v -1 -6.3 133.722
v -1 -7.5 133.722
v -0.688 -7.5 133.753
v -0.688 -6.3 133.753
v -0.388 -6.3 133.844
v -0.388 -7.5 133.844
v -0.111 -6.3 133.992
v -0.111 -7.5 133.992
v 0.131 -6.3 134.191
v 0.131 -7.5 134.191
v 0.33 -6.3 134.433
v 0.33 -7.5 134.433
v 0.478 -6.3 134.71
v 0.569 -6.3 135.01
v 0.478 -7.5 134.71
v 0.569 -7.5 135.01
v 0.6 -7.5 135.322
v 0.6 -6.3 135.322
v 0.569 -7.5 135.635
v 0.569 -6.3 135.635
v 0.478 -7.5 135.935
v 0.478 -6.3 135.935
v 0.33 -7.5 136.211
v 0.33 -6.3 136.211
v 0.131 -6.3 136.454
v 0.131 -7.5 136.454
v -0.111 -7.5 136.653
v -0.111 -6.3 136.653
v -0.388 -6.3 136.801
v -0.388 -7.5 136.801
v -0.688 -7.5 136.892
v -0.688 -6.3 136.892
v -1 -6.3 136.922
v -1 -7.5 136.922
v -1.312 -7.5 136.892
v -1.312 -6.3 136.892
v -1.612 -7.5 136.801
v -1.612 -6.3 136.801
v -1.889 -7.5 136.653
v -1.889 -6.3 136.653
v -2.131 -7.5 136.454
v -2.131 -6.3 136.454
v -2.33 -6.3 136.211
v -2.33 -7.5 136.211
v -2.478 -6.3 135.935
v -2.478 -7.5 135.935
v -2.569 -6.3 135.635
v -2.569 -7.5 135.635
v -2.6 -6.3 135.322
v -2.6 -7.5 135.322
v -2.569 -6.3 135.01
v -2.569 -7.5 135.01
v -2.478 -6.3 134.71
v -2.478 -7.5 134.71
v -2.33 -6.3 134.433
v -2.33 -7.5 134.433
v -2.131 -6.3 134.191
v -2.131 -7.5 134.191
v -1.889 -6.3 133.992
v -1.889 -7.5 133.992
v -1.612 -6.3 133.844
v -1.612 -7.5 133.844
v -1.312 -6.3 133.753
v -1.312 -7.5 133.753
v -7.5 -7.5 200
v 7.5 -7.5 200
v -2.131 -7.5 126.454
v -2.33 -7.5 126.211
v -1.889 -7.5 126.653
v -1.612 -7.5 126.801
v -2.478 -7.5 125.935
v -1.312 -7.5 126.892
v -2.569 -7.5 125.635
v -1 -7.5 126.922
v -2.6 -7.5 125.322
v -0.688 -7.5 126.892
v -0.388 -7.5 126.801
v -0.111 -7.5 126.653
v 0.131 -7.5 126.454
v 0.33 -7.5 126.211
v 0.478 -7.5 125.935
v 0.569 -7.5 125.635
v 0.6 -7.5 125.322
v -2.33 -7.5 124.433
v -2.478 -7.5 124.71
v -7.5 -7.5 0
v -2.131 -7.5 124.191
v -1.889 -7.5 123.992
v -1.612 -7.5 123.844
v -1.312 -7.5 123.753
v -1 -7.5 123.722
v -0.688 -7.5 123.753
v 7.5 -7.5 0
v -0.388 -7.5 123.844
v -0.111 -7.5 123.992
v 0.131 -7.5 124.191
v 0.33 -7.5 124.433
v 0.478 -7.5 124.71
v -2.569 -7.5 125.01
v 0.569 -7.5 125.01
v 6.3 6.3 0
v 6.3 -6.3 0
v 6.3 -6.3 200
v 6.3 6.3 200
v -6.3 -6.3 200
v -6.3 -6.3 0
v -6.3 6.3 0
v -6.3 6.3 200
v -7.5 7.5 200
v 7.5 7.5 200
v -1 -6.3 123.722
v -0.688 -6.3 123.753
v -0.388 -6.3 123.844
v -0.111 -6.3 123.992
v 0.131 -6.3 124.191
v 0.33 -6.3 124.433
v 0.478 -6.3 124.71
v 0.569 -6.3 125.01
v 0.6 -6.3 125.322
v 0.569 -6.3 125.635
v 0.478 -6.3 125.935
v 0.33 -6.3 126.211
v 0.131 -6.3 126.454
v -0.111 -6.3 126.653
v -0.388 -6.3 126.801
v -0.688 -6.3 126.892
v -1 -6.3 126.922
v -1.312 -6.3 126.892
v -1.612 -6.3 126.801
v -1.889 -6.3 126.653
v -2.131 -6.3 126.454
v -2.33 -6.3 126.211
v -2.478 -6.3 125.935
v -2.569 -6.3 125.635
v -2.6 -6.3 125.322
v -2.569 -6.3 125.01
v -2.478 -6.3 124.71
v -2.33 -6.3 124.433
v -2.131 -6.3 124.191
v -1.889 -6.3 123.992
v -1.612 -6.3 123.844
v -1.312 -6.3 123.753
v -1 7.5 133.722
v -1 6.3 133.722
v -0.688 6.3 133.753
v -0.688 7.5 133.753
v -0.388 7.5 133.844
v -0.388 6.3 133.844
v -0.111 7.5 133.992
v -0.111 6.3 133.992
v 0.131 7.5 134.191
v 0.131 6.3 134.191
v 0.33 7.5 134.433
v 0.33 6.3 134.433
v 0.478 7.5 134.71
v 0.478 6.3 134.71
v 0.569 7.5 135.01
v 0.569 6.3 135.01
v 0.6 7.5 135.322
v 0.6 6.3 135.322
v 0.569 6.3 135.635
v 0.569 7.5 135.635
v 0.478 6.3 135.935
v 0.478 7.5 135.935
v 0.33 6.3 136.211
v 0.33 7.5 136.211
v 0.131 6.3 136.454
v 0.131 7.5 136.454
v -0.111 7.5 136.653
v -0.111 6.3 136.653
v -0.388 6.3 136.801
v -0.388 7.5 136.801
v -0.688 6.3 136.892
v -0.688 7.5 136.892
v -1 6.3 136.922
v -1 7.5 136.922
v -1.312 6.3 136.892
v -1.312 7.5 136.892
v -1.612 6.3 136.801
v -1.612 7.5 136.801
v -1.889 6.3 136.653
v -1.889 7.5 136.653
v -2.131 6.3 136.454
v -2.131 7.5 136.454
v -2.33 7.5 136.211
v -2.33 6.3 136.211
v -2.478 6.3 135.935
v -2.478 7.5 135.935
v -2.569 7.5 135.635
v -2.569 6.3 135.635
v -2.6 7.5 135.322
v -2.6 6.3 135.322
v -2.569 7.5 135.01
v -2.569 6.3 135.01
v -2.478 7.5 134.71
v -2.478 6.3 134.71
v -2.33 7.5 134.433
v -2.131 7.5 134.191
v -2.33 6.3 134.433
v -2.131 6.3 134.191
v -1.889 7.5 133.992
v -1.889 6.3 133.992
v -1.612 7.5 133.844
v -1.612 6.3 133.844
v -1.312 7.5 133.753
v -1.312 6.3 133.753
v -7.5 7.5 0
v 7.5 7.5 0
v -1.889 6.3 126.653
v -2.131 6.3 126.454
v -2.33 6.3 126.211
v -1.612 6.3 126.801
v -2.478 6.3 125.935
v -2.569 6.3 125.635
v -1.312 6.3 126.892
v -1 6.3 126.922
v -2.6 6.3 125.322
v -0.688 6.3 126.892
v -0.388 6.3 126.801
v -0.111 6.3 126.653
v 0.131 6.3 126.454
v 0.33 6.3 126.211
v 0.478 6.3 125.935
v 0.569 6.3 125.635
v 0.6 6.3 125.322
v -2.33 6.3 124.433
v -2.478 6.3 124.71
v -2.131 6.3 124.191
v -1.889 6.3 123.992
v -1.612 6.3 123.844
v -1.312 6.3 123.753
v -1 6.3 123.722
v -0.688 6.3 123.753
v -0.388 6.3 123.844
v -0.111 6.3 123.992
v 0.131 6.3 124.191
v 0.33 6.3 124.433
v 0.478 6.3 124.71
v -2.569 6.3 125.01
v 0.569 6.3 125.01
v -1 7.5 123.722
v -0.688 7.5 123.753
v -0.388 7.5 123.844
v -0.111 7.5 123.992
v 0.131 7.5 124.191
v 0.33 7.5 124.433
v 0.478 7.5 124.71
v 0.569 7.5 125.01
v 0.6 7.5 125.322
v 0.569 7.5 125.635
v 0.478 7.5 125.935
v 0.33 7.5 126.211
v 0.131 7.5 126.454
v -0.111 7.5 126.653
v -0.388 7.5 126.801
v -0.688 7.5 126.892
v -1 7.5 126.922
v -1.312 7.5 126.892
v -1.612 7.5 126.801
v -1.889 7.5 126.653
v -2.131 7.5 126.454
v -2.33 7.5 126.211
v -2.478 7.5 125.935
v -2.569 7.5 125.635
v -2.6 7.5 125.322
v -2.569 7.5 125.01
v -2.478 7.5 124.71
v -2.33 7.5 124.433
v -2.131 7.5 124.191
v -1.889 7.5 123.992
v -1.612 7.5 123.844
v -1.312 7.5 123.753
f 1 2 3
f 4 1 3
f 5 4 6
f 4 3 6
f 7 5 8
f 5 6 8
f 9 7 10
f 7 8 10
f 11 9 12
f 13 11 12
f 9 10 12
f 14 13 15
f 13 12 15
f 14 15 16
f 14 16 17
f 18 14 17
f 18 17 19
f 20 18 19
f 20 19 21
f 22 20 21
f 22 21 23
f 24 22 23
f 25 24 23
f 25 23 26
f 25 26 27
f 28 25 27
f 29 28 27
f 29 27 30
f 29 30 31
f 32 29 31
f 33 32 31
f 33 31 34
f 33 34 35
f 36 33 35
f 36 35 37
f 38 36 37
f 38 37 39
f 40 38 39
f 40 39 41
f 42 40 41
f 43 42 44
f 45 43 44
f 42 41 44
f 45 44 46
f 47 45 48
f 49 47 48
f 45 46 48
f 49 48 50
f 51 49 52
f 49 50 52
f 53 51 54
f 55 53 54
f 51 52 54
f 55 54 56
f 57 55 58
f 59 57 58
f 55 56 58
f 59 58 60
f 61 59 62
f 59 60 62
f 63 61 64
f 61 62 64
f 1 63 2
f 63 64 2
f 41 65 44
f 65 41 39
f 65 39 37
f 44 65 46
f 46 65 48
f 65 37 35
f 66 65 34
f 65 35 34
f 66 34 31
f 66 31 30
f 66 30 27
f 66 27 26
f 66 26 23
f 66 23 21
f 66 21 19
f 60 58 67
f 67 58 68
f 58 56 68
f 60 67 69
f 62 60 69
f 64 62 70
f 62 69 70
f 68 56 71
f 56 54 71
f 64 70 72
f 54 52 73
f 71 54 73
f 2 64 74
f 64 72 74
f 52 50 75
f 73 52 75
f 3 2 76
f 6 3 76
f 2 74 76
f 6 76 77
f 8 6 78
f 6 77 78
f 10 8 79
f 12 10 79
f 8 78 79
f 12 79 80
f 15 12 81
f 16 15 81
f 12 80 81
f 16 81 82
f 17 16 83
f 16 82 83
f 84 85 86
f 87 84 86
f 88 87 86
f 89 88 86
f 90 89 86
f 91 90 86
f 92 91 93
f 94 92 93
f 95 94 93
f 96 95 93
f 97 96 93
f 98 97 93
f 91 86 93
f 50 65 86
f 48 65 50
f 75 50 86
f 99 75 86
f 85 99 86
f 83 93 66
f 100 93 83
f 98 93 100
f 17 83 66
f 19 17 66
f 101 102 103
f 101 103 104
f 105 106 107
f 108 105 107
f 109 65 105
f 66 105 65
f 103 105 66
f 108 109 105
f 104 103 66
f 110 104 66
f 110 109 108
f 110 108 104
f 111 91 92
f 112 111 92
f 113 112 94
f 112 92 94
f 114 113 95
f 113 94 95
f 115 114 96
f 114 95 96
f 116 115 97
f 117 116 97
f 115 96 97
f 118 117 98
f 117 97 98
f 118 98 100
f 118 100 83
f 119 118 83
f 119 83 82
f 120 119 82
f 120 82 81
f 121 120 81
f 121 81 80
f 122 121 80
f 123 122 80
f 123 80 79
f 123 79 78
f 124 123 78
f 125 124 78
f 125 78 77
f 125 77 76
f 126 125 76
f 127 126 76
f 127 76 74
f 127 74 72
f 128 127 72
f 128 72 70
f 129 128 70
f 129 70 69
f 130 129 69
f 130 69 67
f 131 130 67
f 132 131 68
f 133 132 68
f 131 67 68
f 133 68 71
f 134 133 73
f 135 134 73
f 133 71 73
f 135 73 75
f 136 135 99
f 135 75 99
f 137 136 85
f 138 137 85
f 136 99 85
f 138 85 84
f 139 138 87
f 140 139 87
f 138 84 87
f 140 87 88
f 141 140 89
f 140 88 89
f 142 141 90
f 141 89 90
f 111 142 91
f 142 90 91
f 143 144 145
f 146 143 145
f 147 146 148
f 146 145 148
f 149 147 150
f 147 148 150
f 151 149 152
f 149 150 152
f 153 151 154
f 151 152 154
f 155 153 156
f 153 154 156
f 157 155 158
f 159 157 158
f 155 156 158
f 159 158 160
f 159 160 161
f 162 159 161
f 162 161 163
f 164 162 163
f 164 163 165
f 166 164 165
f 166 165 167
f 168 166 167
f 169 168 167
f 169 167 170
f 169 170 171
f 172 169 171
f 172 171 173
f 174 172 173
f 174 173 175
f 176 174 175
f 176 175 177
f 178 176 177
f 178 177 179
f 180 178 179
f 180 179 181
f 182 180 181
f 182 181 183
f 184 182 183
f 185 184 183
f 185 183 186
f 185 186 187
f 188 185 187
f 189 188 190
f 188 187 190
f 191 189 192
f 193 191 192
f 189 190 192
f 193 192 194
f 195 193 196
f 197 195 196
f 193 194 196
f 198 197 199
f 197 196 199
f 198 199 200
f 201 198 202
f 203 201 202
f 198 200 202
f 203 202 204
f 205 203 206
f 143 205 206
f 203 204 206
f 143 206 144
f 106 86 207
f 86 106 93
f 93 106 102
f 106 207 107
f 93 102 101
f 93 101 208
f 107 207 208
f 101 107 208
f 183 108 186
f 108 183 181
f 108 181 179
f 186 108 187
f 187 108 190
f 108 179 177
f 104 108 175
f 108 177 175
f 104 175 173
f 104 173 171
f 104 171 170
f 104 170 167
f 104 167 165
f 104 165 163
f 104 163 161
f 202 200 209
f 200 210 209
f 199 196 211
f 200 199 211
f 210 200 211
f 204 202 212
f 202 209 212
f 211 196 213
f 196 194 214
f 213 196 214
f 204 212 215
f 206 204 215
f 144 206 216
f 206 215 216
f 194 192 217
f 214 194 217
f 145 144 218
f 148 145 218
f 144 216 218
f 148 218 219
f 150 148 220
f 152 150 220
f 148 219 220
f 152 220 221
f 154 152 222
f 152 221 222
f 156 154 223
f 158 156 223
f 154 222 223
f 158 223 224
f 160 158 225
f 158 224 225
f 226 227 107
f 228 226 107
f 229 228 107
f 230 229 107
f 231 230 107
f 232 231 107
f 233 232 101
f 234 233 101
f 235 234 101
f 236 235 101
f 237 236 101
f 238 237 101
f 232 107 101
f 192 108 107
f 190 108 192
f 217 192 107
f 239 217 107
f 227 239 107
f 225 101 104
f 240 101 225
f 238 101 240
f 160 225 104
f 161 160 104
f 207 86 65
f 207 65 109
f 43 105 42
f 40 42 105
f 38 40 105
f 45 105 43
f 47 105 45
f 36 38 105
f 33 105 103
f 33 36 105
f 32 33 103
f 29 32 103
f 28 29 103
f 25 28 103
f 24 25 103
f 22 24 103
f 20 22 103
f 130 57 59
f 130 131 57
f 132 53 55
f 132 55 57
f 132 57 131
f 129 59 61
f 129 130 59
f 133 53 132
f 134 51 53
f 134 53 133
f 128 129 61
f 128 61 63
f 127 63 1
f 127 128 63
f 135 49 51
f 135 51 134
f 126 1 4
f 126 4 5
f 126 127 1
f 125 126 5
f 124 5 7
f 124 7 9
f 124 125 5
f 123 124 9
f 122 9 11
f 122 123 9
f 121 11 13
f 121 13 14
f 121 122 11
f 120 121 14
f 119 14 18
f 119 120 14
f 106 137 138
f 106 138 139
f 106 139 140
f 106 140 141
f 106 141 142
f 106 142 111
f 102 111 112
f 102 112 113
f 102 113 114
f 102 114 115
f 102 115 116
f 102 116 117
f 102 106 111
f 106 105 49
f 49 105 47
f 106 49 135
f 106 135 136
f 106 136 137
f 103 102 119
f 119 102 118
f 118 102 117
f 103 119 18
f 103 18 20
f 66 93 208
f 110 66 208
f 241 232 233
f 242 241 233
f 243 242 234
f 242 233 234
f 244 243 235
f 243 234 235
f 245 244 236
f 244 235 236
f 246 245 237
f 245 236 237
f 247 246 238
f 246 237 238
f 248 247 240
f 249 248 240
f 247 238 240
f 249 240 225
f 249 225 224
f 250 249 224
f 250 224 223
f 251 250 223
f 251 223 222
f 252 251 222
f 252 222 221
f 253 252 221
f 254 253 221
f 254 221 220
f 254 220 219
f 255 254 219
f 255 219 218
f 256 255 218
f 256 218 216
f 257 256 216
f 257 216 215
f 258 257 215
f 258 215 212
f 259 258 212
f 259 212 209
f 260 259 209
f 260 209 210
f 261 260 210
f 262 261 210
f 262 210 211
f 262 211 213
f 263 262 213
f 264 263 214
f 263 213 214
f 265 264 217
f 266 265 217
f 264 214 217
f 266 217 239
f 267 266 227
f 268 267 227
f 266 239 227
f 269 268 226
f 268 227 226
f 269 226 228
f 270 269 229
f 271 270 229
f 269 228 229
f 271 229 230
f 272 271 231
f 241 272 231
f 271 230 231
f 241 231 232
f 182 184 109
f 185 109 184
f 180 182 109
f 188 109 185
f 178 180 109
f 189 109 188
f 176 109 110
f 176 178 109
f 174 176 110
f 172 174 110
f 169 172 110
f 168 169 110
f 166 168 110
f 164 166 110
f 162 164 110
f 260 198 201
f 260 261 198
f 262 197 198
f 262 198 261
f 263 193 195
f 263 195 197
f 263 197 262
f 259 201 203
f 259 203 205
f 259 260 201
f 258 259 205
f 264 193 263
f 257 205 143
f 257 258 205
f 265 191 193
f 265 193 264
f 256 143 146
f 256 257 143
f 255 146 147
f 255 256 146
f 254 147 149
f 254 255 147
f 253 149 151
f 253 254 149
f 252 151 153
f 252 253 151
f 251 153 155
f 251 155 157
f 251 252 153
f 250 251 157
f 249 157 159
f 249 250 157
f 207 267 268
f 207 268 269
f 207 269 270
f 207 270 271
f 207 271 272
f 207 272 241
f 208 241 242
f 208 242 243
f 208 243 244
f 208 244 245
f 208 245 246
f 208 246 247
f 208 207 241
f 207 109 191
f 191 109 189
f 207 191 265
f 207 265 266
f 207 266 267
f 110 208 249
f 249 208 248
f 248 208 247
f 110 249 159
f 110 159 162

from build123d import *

# Parameters (mm, degrees)
SKETCH_1_W          = 15
SKETCH_1_H          = 15
SKETCH_1_W_2        = 12.6
SKETCH_1_H_2        = 12.6
EXTRUDE_1_DEPTH     = 200
SKETCH_2_R          = 1.6
CUT_EXTRUDE_1_DEPTH = 25


with BuildPart() as part:
    # 草图1 → 凸台-拉伸1 (new body)
    with BuildSketch(Plane.XY):
        Rectangle(SKETCH_1_W, SKETCH_1_H)
        Rectangle(SKETCH_1_W_2, SKETCH_1_H_2, mode=Mode.SUBTRACT)
    extrude(amount=EXTRUDE_1_DEPTH)

    # 草图2 → 切除-拉伸1 (cut)
    with BuildSketch(Plane.XZ.offset(7.5)):
        with Locations(Location((-1, 135.322387076, 0), (0, 0, 270))):
            Circle(SKETCH_2_R)
        with Locations(Location((-1, 125.322387076, 0), (0, 0, 270))):
            Circle(SKETCH_2_R)
    extrude(amount=-CUT_EXTRUDE_1_DEPTH, mode=Mode.SUBTRACT)


solid = part.part
